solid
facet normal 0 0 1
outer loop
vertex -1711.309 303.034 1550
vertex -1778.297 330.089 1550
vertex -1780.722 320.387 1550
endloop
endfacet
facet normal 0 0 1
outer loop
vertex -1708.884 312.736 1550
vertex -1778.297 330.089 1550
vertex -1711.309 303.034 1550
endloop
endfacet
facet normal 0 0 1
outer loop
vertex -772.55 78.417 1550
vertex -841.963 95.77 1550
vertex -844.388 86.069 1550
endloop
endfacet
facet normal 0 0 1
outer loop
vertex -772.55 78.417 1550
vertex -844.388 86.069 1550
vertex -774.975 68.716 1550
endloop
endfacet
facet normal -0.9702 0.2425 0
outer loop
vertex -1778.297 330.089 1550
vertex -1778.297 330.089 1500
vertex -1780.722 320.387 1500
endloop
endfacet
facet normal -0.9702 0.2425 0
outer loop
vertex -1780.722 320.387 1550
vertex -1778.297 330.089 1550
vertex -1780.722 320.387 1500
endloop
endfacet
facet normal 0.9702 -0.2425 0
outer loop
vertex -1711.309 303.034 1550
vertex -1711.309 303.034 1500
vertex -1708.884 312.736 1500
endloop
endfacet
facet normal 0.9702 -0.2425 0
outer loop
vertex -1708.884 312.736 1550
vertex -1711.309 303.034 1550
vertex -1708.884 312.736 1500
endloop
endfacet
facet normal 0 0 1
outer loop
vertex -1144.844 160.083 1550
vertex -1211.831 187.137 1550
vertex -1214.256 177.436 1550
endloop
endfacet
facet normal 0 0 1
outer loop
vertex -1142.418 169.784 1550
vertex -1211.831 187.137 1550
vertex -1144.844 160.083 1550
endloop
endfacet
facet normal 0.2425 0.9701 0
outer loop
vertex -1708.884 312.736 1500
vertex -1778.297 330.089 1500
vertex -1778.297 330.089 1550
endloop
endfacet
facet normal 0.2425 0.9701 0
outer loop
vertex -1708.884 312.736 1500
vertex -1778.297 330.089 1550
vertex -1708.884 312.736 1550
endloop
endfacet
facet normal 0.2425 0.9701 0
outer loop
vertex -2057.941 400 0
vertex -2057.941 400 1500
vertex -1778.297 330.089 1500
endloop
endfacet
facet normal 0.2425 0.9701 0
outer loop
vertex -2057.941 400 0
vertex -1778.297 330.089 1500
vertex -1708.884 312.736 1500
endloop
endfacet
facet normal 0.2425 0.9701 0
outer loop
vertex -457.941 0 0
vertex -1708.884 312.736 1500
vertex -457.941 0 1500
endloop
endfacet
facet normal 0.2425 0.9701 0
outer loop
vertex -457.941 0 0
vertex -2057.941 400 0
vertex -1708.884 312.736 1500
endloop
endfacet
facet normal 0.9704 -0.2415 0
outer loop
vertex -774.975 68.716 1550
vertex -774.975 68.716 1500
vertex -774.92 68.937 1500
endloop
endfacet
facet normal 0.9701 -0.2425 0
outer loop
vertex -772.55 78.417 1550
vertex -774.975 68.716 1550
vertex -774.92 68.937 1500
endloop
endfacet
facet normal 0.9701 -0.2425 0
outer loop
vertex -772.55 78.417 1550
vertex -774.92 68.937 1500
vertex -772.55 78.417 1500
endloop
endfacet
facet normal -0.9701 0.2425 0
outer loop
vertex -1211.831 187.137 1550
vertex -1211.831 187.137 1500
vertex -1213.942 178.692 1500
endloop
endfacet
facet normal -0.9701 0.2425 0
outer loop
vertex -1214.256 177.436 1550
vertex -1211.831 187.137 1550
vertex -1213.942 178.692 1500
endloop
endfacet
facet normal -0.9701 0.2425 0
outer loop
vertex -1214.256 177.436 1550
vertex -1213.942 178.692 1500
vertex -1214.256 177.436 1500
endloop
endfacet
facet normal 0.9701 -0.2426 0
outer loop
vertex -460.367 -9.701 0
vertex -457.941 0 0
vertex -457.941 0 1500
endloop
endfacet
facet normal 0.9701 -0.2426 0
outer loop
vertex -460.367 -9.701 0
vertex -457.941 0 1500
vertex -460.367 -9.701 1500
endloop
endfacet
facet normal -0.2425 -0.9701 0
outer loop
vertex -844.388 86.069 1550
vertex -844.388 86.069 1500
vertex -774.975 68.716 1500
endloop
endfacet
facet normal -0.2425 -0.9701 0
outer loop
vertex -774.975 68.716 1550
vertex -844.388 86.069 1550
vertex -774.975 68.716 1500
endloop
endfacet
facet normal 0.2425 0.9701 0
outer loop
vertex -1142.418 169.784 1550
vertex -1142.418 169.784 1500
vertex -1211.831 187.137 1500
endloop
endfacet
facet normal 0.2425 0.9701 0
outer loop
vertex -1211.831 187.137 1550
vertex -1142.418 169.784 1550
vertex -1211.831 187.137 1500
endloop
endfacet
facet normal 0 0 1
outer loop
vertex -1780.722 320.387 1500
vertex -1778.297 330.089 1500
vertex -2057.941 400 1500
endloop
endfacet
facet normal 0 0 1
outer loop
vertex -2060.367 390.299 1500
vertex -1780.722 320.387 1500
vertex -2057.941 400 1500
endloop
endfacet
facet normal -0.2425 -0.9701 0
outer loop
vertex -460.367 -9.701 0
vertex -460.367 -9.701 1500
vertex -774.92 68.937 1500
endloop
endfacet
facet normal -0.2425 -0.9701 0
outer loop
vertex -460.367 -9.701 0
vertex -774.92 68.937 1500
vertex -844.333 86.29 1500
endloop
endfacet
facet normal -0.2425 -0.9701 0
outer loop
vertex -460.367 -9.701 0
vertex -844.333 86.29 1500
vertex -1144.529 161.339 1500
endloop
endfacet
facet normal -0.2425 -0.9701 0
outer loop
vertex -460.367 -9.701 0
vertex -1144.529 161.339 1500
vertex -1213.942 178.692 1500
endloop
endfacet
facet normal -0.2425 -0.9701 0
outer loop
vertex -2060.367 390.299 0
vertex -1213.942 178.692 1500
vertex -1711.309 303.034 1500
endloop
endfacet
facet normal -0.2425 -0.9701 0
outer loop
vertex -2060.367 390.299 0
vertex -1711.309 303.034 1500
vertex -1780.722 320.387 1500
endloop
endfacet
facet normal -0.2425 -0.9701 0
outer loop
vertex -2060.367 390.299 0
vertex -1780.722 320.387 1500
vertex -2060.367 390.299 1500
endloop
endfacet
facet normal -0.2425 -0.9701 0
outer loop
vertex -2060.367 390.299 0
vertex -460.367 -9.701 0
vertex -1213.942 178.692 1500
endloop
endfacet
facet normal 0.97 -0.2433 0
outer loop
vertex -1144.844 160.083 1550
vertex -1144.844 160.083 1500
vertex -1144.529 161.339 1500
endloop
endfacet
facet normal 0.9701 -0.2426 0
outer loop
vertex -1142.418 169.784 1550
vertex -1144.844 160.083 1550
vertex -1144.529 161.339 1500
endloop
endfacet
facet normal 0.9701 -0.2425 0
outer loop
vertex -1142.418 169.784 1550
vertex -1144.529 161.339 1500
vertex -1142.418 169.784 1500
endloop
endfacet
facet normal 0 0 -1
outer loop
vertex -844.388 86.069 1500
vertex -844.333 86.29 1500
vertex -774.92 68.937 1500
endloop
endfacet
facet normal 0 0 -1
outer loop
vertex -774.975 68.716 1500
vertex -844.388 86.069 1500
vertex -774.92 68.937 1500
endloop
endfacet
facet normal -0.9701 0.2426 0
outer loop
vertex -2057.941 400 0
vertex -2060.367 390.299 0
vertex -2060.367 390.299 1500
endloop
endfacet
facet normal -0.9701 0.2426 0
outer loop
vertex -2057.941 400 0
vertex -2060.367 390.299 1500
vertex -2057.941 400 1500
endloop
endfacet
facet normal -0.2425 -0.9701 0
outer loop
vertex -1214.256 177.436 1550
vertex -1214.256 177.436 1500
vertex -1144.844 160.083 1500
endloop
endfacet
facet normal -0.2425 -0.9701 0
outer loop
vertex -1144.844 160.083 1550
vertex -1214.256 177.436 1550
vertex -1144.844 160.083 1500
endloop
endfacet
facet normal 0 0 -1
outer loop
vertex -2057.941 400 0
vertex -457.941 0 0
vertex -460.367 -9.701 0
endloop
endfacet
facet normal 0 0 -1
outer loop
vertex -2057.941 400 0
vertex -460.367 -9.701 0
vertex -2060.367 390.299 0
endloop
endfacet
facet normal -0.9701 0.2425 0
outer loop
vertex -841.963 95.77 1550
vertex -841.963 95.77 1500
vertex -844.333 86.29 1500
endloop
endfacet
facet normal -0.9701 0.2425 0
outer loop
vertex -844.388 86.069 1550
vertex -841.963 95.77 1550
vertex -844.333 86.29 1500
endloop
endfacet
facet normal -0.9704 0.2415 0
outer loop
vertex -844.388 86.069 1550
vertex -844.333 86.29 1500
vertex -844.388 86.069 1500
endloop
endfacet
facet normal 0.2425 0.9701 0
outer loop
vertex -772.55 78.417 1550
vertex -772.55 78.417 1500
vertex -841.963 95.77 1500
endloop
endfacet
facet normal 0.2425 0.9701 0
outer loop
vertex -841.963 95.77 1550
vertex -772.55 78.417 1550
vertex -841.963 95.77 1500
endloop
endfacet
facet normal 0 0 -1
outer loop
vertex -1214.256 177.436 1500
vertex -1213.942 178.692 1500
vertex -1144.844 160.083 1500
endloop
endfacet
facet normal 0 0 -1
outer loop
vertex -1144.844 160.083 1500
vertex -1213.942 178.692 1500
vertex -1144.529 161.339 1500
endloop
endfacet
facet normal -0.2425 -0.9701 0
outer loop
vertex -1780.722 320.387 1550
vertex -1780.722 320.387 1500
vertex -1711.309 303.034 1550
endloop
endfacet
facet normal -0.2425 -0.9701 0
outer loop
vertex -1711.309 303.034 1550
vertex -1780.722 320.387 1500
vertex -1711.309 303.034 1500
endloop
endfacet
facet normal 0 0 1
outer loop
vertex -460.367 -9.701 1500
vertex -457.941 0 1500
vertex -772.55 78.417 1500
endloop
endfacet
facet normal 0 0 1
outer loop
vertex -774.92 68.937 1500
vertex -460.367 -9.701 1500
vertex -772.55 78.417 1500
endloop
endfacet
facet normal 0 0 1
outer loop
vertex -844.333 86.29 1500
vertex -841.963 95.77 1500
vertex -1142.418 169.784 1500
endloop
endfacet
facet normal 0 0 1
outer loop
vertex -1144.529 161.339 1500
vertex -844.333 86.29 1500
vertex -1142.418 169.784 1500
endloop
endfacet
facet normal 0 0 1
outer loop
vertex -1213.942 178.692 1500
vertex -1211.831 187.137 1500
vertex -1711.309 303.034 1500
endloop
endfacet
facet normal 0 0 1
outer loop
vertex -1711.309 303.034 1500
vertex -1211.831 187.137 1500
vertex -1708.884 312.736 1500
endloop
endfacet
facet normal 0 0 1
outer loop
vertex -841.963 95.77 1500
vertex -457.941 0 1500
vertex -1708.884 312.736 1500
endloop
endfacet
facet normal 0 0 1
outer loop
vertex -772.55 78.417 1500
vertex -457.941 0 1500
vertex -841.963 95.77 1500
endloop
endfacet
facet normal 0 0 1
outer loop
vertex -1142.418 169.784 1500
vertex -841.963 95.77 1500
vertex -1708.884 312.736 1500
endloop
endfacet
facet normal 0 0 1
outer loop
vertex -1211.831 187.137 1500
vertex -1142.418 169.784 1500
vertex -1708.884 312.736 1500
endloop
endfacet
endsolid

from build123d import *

# Parameters (mm, degrees)
EXTRUDE_1_DEPTH = 1500
EXTRUDE_2_DEPTH = 50
EXTRUDE_5_DEPTH = 50
EXTRUDE_6_DEPTH = 50


with BuildPart() as part:
    # 草图2 → 拉伸-薄壁1 (new body)
    with BuildSketch(Plane.XY):
        Polygon((-2057.941251584, 400), (-457.941251584, 0), (-460.366607835, -9.701425001), (-2060.366607835, 390.298574999), align=None)
    extrude(amount=EXTRUDE_1_DEPTH)

    # 草图3 → 凸台-拉伸2 (add)
    with BuildSketch(Plane.XY.offset(1500)):
        Polygon((-1778.296514005, 330.088815605), (-1780.721870255, 320.387390604), (-1711.309316368, 303.034252132), (-1708.883960117, 312.735677133), align=None)
    extrude(amount=EXTRUDE_2_DEPTH)

    # 草图8 → 凸台-拉伸5 (add)
    with BuildSketch(Plane.XY.offset(1500)):
        Polygon((-841.962523584, 95.770350875), (-844.387879834, 86.068925873), (-774.975325947, 68.715787402), (-772.549969697, 78.417212403), align=None)
    extrude(amount=EXTRUDE_5_DEPTH)

    # 草图9 → 凸台-拉伸6 (add)
    with BuildSketch(Plane.XY.offset(1500)):
        Polygon((-1211.830765034, 187.137147041), (-1214.256121285, 177.435722039), (-1144.843567398, 160.082583568), (-1142.418211147, 169.784008569), align=None)
    extrude(amount=EXTRUDE_6_DEPTH)


solid = part.part
